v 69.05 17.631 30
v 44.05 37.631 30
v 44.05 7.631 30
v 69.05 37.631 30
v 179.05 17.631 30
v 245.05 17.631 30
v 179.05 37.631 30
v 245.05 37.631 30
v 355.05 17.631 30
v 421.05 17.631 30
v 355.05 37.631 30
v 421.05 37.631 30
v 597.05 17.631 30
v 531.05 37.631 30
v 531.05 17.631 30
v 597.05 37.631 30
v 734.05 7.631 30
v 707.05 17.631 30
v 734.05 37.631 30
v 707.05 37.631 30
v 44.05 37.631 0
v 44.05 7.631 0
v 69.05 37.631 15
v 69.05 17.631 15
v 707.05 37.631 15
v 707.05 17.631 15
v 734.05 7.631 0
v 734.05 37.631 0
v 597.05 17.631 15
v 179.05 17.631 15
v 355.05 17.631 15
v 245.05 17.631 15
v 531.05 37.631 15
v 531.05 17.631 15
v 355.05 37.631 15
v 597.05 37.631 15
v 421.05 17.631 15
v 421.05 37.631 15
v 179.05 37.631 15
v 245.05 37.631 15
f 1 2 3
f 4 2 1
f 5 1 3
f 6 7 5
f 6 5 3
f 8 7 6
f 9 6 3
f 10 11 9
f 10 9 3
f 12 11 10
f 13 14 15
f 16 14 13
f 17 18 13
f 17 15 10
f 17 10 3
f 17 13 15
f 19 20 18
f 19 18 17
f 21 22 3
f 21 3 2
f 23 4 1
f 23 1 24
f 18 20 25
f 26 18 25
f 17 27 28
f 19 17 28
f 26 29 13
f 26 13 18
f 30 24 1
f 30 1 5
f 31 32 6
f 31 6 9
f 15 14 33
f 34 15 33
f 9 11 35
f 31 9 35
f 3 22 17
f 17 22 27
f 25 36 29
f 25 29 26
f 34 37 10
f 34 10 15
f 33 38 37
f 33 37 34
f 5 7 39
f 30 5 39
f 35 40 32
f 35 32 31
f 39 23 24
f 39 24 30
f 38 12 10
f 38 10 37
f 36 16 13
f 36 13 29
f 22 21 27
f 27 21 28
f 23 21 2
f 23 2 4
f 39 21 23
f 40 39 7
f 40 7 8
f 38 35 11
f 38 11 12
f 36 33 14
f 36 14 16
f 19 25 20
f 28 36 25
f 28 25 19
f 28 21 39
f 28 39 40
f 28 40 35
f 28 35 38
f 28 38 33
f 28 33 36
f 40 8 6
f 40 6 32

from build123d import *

# Parameters (mm, degrees)
SKETCH_1_W             = 690
SKETCH_1_H             = 30
EXTRUDE_1_DEPTH        = 30
SKETCH_2_W             = 110
SKETCH_2_H             = 15
CUT_EXTRUDE_1_DEPTH    = 20
PATTERN_LINEAR_1_COUNT = 4
PATTERN_LINEAR_1_PITCH = 176


with BuildPart() as part:
    # Эскиз1 → Бобышка-Вытянуть1 (new body)
    with BuildSketch(Plane.XY):
        with Locations((389.050320868, 22.631091658)):
            Rectangle(SKETCH_1_W, SKETCH_1_H)
    extrude(amount=EXTRUDE_1_DEPTH)

    # Эскиз2 → Вырез-Вытянуть1 (cut)
    with BuildSketch(Plane(origin=(0, 37.631091658, 0), x_dir=(1, 0, 0), z_dir=(0, 1, 0))):
        with Locations((124.050320868, -22.5)):
            Rectangle(SKETCH_2_W, SKETCH_2_H)
    cut_extrude_1 = extrude(amount=-CUT_EXTRUDE_1_DEPTH, mode=Mode.SUBTRACT)

    # Линейный массив1: Вырез-Вытянуть1 ×4
    with Locations(*[(i * PATTERN_LINEAR_1_PITCH, 0, 0) for i in range(1, PATTERN_LINEAR_1_COUNT)]):
        add(cut_extrude_1, mode=Mode.SUBTRACT)


solid = part.part
